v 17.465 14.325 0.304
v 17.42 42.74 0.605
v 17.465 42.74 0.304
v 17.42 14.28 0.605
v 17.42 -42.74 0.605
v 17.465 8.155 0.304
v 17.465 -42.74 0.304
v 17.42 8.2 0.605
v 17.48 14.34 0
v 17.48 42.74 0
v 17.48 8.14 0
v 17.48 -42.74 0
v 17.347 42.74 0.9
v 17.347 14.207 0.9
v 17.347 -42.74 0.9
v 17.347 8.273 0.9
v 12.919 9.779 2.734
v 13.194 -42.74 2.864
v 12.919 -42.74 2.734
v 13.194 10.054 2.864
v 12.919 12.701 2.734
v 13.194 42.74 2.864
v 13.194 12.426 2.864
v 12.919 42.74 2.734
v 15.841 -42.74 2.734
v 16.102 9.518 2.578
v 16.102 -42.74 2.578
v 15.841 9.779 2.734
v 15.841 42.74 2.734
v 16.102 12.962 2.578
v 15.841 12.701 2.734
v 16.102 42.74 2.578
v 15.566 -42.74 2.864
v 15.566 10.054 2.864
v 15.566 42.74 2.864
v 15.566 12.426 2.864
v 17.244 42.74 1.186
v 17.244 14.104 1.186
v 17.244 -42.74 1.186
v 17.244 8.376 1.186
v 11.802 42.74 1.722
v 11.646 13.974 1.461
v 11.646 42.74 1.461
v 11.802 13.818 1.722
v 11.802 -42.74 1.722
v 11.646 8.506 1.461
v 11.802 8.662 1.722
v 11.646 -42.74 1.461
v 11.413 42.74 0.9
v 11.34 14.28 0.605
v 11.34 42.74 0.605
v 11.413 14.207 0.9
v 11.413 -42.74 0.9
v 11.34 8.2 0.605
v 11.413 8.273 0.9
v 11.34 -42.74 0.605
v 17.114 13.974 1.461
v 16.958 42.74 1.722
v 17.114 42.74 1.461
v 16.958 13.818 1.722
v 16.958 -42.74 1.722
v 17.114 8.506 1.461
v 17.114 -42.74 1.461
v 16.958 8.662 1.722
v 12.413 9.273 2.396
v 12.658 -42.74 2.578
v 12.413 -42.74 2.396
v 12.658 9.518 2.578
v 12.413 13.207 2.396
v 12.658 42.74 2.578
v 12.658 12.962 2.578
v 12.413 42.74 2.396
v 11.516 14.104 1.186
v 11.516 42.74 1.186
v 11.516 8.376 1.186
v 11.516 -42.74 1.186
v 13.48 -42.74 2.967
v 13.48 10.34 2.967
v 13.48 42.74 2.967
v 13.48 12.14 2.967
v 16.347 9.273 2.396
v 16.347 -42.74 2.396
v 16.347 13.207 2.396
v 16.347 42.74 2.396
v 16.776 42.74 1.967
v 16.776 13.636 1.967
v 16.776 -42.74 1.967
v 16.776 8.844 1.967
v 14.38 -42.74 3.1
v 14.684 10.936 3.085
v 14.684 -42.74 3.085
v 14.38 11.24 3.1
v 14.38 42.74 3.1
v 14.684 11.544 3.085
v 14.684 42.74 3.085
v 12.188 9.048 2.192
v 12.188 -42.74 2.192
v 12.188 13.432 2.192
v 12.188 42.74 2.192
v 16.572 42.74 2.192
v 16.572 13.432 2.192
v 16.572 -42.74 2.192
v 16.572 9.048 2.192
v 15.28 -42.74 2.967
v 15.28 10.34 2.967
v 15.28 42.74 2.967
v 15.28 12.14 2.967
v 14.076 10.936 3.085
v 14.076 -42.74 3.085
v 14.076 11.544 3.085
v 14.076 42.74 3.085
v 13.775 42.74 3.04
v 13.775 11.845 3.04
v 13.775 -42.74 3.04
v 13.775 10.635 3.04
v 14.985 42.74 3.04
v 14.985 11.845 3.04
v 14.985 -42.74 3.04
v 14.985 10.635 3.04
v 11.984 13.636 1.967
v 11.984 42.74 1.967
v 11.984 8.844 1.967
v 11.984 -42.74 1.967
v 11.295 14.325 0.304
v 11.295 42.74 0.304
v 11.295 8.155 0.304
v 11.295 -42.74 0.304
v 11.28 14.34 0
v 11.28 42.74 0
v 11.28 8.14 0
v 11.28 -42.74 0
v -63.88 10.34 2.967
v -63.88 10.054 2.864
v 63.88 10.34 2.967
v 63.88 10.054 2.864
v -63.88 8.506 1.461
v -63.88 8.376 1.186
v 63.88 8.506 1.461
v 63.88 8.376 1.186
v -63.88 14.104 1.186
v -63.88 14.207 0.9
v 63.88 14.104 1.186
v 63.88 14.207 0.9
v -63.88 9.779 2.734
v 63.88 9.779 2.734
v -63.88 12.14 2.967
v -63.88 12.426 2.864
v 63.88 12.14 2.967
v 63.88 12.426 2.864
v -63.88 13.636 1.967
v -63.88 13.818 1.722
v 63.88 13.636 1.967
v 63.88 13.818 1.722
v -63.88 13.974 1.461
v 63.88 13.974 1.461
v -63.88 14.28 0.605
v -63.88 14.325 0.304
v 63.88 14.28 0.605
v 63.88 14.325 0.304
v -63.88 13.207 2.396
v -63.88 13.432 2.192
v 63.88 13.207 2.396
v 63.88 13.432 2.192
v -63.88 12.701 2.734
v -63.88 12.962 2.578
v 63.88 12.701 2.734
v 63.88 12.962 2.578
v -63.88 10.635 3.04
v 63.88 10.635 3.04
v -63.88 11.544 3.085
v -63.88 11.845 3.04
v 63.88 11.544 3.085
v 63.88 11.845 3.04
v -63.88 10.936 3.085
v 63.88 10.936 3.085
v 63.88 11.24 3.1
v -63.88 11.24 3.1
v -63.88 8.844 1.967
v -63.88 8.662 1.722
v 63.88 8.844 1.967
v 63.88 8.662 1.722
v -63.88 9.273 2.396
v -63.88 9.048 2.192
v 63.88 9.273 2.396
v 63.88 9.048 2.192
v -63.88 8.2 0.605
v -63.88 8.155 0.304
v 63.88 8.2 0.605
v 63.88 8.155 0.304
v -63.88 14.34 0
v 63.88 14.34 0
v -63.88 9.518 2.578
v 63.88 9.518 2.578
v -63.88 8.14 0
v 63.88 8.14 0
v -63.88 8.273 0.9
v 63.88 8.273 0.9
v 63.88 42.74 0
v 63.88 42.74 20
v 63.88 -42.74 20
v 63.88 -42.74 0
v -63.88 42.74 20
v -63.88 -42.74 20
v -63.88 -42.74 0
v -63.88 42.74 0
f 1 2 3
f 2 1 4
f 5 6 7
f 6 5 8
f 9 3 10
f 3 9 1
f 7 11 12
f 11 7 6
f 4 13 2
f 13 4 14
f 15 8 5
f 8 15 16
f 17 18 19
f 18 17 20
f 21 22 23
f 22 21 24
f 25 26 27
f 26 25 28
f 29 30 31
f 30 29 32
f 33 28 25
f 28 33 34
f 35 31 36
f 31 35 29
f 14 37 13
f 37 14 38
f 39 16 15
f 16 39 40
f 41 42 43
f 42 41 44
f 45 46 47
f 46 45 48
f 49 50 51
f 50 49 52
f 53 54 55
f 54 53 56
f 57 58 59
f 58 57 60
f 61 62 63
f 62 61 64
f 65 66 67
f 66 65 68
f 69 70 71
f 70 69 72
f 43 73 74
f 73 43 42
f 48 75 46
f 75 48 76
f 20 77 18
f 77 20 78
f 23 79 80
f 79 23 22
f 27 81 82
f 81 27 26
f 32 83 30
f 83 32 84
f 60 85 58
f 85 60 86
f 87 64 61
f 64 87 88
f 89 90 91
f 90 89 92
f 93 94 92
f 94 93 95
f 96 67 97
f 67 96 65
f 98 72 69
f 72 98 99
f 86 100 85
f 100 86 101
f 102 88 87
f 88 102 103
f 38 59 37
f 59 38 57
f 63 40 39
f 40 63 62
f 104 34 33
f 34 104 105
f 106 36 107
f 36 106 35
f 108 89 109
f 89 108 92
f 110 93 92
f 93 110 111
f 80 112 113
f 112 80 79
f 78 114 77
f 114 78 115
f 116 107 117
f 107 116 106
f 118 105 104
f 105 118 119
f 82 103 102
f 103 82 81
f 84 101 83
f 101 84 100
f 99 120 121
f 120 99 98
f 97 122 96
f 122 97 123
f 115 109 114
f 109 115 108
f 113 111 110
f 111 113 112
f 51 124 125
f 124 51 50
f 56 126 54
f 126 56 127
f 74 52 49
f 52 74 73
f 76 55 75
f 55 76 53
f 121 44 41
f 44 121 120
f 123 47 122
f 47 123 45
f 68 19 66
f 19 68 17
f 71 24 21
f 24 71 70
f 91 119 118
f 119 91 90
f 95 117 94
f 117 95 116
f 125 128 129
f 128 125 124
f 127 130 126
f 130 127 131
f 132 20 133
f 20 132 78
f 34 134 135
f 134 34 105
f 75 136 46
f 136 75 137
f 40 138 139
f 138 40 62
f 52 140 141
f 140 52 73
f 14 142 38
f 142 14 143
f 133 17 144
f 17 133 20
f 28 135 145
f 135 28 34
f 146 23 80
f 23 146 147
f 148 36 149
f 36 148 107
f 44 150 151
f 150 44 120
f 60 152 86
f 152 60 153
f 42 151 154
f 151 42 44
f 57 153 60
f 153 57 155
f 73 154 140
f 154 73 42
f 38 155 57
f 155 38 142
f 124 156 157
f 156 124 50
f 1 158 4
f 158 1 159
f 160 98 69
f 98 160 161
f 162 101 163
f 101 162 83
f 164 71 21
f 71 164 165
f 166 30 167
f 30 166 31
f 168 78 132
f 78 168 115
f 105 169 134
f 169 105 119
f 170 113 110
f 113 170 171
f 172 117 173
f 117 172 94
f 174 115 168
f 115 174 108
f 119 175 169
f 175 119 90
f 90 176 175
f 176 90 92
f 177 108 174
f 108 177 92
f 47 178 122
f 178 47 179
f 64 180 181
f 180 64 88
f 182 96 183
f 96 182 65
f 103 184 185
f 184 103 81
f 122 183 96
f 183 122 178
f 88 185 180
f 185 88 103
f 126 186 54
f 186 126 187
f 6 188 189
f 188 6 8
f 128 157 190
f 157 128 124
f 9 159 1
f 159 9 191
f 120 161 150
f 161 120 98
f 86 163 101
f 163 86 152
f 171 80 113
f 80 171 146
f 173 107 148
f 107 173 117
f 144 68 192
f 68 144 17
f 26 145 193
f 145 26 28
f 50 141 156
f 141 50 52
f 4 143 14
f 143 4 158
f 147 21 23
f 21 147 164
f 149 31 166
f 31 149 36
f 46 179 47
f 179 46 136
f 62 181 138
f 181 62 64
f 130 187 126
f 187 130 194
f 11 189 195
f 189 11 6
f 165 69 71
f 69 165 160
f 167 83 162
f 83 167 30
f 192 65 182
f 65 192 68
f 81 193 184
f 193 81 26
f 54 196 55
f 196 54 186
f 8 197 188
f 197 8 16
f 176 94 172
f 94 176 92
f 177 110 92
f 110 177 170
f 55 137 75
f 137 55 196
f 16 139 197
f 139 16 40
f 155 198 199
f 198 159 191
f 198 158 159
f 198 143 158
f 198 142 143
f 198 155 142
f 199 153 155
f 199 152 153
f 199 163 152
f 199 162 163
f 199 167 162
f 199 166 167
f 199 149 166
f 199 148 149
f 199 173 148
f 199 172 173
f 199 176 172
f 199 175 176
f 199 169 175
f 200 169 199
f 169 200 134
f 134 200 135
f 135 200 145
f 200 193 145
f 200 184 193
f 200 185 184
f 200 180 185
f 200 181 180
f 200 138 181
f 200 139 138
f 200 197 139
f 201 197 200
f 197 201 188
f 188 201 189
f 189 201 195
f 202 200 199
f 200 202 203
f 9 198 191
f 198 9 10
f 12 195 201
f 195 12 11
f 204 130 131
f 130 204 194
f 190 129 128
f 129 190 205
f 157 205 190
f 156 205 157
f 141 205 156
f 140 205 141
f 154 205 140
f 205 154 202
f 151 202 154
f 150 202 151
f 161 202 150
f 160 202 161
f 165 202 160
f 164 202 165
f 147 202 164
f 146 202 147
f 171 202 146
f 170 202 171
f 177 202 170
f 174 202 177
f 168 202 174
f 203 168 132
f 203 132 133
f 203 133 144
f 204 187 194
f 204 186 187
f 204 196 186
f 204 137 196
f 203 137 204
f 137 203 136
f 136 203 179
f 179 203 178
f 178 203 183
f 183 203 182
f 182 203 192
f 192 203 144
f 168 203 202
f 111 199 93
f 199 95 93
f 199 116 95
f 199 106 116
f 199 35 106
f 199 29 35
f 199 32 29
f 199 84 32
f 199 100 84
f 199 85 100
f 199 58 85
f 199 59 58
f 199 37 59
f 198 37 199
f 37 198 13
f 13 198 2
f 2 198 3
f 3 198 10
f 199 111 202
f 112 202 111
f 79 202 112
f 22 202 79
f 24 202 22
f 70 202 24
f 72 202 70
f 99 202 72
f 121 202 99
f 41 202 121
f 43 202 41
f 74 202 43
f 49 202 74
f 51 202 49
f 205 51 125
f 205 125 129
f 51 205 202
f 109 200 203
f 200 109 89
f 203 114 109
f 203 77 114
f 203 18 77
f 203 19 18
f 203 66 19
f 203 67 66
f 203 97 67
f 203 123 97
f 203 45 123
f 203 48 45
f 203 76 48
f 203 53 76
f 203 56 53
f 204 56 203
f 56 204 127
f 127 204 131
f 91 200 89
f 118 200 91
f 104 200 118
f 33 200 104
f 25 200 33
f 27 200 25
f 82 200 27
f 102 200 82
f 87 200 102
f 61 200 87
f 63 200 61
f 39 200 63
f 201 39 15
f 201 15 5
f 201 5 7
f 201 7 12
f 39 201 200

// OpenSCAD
// Built by bench/smallmodels/features/compiler.py from a list of features.
$fn = 64;
difference() {
  union() {
    translate([0, 0, 0]) translate([-63.88, -42.74, 0]) cube([127.76, 85.48, 20]);
  }
  union() {
    translate([14.38, 11.24, 0]) rotate([0, 0, 0]) rotate([90, 0, 0]) cylinder(d = 6.2, h = 1080, center = true);
    translate([14.38, 11.24, 0]) rotate([0, 0, 0]) rotate([0, 90, 0]) cylinder(d = 6.2, h = 1080, center = true);
  }
}
